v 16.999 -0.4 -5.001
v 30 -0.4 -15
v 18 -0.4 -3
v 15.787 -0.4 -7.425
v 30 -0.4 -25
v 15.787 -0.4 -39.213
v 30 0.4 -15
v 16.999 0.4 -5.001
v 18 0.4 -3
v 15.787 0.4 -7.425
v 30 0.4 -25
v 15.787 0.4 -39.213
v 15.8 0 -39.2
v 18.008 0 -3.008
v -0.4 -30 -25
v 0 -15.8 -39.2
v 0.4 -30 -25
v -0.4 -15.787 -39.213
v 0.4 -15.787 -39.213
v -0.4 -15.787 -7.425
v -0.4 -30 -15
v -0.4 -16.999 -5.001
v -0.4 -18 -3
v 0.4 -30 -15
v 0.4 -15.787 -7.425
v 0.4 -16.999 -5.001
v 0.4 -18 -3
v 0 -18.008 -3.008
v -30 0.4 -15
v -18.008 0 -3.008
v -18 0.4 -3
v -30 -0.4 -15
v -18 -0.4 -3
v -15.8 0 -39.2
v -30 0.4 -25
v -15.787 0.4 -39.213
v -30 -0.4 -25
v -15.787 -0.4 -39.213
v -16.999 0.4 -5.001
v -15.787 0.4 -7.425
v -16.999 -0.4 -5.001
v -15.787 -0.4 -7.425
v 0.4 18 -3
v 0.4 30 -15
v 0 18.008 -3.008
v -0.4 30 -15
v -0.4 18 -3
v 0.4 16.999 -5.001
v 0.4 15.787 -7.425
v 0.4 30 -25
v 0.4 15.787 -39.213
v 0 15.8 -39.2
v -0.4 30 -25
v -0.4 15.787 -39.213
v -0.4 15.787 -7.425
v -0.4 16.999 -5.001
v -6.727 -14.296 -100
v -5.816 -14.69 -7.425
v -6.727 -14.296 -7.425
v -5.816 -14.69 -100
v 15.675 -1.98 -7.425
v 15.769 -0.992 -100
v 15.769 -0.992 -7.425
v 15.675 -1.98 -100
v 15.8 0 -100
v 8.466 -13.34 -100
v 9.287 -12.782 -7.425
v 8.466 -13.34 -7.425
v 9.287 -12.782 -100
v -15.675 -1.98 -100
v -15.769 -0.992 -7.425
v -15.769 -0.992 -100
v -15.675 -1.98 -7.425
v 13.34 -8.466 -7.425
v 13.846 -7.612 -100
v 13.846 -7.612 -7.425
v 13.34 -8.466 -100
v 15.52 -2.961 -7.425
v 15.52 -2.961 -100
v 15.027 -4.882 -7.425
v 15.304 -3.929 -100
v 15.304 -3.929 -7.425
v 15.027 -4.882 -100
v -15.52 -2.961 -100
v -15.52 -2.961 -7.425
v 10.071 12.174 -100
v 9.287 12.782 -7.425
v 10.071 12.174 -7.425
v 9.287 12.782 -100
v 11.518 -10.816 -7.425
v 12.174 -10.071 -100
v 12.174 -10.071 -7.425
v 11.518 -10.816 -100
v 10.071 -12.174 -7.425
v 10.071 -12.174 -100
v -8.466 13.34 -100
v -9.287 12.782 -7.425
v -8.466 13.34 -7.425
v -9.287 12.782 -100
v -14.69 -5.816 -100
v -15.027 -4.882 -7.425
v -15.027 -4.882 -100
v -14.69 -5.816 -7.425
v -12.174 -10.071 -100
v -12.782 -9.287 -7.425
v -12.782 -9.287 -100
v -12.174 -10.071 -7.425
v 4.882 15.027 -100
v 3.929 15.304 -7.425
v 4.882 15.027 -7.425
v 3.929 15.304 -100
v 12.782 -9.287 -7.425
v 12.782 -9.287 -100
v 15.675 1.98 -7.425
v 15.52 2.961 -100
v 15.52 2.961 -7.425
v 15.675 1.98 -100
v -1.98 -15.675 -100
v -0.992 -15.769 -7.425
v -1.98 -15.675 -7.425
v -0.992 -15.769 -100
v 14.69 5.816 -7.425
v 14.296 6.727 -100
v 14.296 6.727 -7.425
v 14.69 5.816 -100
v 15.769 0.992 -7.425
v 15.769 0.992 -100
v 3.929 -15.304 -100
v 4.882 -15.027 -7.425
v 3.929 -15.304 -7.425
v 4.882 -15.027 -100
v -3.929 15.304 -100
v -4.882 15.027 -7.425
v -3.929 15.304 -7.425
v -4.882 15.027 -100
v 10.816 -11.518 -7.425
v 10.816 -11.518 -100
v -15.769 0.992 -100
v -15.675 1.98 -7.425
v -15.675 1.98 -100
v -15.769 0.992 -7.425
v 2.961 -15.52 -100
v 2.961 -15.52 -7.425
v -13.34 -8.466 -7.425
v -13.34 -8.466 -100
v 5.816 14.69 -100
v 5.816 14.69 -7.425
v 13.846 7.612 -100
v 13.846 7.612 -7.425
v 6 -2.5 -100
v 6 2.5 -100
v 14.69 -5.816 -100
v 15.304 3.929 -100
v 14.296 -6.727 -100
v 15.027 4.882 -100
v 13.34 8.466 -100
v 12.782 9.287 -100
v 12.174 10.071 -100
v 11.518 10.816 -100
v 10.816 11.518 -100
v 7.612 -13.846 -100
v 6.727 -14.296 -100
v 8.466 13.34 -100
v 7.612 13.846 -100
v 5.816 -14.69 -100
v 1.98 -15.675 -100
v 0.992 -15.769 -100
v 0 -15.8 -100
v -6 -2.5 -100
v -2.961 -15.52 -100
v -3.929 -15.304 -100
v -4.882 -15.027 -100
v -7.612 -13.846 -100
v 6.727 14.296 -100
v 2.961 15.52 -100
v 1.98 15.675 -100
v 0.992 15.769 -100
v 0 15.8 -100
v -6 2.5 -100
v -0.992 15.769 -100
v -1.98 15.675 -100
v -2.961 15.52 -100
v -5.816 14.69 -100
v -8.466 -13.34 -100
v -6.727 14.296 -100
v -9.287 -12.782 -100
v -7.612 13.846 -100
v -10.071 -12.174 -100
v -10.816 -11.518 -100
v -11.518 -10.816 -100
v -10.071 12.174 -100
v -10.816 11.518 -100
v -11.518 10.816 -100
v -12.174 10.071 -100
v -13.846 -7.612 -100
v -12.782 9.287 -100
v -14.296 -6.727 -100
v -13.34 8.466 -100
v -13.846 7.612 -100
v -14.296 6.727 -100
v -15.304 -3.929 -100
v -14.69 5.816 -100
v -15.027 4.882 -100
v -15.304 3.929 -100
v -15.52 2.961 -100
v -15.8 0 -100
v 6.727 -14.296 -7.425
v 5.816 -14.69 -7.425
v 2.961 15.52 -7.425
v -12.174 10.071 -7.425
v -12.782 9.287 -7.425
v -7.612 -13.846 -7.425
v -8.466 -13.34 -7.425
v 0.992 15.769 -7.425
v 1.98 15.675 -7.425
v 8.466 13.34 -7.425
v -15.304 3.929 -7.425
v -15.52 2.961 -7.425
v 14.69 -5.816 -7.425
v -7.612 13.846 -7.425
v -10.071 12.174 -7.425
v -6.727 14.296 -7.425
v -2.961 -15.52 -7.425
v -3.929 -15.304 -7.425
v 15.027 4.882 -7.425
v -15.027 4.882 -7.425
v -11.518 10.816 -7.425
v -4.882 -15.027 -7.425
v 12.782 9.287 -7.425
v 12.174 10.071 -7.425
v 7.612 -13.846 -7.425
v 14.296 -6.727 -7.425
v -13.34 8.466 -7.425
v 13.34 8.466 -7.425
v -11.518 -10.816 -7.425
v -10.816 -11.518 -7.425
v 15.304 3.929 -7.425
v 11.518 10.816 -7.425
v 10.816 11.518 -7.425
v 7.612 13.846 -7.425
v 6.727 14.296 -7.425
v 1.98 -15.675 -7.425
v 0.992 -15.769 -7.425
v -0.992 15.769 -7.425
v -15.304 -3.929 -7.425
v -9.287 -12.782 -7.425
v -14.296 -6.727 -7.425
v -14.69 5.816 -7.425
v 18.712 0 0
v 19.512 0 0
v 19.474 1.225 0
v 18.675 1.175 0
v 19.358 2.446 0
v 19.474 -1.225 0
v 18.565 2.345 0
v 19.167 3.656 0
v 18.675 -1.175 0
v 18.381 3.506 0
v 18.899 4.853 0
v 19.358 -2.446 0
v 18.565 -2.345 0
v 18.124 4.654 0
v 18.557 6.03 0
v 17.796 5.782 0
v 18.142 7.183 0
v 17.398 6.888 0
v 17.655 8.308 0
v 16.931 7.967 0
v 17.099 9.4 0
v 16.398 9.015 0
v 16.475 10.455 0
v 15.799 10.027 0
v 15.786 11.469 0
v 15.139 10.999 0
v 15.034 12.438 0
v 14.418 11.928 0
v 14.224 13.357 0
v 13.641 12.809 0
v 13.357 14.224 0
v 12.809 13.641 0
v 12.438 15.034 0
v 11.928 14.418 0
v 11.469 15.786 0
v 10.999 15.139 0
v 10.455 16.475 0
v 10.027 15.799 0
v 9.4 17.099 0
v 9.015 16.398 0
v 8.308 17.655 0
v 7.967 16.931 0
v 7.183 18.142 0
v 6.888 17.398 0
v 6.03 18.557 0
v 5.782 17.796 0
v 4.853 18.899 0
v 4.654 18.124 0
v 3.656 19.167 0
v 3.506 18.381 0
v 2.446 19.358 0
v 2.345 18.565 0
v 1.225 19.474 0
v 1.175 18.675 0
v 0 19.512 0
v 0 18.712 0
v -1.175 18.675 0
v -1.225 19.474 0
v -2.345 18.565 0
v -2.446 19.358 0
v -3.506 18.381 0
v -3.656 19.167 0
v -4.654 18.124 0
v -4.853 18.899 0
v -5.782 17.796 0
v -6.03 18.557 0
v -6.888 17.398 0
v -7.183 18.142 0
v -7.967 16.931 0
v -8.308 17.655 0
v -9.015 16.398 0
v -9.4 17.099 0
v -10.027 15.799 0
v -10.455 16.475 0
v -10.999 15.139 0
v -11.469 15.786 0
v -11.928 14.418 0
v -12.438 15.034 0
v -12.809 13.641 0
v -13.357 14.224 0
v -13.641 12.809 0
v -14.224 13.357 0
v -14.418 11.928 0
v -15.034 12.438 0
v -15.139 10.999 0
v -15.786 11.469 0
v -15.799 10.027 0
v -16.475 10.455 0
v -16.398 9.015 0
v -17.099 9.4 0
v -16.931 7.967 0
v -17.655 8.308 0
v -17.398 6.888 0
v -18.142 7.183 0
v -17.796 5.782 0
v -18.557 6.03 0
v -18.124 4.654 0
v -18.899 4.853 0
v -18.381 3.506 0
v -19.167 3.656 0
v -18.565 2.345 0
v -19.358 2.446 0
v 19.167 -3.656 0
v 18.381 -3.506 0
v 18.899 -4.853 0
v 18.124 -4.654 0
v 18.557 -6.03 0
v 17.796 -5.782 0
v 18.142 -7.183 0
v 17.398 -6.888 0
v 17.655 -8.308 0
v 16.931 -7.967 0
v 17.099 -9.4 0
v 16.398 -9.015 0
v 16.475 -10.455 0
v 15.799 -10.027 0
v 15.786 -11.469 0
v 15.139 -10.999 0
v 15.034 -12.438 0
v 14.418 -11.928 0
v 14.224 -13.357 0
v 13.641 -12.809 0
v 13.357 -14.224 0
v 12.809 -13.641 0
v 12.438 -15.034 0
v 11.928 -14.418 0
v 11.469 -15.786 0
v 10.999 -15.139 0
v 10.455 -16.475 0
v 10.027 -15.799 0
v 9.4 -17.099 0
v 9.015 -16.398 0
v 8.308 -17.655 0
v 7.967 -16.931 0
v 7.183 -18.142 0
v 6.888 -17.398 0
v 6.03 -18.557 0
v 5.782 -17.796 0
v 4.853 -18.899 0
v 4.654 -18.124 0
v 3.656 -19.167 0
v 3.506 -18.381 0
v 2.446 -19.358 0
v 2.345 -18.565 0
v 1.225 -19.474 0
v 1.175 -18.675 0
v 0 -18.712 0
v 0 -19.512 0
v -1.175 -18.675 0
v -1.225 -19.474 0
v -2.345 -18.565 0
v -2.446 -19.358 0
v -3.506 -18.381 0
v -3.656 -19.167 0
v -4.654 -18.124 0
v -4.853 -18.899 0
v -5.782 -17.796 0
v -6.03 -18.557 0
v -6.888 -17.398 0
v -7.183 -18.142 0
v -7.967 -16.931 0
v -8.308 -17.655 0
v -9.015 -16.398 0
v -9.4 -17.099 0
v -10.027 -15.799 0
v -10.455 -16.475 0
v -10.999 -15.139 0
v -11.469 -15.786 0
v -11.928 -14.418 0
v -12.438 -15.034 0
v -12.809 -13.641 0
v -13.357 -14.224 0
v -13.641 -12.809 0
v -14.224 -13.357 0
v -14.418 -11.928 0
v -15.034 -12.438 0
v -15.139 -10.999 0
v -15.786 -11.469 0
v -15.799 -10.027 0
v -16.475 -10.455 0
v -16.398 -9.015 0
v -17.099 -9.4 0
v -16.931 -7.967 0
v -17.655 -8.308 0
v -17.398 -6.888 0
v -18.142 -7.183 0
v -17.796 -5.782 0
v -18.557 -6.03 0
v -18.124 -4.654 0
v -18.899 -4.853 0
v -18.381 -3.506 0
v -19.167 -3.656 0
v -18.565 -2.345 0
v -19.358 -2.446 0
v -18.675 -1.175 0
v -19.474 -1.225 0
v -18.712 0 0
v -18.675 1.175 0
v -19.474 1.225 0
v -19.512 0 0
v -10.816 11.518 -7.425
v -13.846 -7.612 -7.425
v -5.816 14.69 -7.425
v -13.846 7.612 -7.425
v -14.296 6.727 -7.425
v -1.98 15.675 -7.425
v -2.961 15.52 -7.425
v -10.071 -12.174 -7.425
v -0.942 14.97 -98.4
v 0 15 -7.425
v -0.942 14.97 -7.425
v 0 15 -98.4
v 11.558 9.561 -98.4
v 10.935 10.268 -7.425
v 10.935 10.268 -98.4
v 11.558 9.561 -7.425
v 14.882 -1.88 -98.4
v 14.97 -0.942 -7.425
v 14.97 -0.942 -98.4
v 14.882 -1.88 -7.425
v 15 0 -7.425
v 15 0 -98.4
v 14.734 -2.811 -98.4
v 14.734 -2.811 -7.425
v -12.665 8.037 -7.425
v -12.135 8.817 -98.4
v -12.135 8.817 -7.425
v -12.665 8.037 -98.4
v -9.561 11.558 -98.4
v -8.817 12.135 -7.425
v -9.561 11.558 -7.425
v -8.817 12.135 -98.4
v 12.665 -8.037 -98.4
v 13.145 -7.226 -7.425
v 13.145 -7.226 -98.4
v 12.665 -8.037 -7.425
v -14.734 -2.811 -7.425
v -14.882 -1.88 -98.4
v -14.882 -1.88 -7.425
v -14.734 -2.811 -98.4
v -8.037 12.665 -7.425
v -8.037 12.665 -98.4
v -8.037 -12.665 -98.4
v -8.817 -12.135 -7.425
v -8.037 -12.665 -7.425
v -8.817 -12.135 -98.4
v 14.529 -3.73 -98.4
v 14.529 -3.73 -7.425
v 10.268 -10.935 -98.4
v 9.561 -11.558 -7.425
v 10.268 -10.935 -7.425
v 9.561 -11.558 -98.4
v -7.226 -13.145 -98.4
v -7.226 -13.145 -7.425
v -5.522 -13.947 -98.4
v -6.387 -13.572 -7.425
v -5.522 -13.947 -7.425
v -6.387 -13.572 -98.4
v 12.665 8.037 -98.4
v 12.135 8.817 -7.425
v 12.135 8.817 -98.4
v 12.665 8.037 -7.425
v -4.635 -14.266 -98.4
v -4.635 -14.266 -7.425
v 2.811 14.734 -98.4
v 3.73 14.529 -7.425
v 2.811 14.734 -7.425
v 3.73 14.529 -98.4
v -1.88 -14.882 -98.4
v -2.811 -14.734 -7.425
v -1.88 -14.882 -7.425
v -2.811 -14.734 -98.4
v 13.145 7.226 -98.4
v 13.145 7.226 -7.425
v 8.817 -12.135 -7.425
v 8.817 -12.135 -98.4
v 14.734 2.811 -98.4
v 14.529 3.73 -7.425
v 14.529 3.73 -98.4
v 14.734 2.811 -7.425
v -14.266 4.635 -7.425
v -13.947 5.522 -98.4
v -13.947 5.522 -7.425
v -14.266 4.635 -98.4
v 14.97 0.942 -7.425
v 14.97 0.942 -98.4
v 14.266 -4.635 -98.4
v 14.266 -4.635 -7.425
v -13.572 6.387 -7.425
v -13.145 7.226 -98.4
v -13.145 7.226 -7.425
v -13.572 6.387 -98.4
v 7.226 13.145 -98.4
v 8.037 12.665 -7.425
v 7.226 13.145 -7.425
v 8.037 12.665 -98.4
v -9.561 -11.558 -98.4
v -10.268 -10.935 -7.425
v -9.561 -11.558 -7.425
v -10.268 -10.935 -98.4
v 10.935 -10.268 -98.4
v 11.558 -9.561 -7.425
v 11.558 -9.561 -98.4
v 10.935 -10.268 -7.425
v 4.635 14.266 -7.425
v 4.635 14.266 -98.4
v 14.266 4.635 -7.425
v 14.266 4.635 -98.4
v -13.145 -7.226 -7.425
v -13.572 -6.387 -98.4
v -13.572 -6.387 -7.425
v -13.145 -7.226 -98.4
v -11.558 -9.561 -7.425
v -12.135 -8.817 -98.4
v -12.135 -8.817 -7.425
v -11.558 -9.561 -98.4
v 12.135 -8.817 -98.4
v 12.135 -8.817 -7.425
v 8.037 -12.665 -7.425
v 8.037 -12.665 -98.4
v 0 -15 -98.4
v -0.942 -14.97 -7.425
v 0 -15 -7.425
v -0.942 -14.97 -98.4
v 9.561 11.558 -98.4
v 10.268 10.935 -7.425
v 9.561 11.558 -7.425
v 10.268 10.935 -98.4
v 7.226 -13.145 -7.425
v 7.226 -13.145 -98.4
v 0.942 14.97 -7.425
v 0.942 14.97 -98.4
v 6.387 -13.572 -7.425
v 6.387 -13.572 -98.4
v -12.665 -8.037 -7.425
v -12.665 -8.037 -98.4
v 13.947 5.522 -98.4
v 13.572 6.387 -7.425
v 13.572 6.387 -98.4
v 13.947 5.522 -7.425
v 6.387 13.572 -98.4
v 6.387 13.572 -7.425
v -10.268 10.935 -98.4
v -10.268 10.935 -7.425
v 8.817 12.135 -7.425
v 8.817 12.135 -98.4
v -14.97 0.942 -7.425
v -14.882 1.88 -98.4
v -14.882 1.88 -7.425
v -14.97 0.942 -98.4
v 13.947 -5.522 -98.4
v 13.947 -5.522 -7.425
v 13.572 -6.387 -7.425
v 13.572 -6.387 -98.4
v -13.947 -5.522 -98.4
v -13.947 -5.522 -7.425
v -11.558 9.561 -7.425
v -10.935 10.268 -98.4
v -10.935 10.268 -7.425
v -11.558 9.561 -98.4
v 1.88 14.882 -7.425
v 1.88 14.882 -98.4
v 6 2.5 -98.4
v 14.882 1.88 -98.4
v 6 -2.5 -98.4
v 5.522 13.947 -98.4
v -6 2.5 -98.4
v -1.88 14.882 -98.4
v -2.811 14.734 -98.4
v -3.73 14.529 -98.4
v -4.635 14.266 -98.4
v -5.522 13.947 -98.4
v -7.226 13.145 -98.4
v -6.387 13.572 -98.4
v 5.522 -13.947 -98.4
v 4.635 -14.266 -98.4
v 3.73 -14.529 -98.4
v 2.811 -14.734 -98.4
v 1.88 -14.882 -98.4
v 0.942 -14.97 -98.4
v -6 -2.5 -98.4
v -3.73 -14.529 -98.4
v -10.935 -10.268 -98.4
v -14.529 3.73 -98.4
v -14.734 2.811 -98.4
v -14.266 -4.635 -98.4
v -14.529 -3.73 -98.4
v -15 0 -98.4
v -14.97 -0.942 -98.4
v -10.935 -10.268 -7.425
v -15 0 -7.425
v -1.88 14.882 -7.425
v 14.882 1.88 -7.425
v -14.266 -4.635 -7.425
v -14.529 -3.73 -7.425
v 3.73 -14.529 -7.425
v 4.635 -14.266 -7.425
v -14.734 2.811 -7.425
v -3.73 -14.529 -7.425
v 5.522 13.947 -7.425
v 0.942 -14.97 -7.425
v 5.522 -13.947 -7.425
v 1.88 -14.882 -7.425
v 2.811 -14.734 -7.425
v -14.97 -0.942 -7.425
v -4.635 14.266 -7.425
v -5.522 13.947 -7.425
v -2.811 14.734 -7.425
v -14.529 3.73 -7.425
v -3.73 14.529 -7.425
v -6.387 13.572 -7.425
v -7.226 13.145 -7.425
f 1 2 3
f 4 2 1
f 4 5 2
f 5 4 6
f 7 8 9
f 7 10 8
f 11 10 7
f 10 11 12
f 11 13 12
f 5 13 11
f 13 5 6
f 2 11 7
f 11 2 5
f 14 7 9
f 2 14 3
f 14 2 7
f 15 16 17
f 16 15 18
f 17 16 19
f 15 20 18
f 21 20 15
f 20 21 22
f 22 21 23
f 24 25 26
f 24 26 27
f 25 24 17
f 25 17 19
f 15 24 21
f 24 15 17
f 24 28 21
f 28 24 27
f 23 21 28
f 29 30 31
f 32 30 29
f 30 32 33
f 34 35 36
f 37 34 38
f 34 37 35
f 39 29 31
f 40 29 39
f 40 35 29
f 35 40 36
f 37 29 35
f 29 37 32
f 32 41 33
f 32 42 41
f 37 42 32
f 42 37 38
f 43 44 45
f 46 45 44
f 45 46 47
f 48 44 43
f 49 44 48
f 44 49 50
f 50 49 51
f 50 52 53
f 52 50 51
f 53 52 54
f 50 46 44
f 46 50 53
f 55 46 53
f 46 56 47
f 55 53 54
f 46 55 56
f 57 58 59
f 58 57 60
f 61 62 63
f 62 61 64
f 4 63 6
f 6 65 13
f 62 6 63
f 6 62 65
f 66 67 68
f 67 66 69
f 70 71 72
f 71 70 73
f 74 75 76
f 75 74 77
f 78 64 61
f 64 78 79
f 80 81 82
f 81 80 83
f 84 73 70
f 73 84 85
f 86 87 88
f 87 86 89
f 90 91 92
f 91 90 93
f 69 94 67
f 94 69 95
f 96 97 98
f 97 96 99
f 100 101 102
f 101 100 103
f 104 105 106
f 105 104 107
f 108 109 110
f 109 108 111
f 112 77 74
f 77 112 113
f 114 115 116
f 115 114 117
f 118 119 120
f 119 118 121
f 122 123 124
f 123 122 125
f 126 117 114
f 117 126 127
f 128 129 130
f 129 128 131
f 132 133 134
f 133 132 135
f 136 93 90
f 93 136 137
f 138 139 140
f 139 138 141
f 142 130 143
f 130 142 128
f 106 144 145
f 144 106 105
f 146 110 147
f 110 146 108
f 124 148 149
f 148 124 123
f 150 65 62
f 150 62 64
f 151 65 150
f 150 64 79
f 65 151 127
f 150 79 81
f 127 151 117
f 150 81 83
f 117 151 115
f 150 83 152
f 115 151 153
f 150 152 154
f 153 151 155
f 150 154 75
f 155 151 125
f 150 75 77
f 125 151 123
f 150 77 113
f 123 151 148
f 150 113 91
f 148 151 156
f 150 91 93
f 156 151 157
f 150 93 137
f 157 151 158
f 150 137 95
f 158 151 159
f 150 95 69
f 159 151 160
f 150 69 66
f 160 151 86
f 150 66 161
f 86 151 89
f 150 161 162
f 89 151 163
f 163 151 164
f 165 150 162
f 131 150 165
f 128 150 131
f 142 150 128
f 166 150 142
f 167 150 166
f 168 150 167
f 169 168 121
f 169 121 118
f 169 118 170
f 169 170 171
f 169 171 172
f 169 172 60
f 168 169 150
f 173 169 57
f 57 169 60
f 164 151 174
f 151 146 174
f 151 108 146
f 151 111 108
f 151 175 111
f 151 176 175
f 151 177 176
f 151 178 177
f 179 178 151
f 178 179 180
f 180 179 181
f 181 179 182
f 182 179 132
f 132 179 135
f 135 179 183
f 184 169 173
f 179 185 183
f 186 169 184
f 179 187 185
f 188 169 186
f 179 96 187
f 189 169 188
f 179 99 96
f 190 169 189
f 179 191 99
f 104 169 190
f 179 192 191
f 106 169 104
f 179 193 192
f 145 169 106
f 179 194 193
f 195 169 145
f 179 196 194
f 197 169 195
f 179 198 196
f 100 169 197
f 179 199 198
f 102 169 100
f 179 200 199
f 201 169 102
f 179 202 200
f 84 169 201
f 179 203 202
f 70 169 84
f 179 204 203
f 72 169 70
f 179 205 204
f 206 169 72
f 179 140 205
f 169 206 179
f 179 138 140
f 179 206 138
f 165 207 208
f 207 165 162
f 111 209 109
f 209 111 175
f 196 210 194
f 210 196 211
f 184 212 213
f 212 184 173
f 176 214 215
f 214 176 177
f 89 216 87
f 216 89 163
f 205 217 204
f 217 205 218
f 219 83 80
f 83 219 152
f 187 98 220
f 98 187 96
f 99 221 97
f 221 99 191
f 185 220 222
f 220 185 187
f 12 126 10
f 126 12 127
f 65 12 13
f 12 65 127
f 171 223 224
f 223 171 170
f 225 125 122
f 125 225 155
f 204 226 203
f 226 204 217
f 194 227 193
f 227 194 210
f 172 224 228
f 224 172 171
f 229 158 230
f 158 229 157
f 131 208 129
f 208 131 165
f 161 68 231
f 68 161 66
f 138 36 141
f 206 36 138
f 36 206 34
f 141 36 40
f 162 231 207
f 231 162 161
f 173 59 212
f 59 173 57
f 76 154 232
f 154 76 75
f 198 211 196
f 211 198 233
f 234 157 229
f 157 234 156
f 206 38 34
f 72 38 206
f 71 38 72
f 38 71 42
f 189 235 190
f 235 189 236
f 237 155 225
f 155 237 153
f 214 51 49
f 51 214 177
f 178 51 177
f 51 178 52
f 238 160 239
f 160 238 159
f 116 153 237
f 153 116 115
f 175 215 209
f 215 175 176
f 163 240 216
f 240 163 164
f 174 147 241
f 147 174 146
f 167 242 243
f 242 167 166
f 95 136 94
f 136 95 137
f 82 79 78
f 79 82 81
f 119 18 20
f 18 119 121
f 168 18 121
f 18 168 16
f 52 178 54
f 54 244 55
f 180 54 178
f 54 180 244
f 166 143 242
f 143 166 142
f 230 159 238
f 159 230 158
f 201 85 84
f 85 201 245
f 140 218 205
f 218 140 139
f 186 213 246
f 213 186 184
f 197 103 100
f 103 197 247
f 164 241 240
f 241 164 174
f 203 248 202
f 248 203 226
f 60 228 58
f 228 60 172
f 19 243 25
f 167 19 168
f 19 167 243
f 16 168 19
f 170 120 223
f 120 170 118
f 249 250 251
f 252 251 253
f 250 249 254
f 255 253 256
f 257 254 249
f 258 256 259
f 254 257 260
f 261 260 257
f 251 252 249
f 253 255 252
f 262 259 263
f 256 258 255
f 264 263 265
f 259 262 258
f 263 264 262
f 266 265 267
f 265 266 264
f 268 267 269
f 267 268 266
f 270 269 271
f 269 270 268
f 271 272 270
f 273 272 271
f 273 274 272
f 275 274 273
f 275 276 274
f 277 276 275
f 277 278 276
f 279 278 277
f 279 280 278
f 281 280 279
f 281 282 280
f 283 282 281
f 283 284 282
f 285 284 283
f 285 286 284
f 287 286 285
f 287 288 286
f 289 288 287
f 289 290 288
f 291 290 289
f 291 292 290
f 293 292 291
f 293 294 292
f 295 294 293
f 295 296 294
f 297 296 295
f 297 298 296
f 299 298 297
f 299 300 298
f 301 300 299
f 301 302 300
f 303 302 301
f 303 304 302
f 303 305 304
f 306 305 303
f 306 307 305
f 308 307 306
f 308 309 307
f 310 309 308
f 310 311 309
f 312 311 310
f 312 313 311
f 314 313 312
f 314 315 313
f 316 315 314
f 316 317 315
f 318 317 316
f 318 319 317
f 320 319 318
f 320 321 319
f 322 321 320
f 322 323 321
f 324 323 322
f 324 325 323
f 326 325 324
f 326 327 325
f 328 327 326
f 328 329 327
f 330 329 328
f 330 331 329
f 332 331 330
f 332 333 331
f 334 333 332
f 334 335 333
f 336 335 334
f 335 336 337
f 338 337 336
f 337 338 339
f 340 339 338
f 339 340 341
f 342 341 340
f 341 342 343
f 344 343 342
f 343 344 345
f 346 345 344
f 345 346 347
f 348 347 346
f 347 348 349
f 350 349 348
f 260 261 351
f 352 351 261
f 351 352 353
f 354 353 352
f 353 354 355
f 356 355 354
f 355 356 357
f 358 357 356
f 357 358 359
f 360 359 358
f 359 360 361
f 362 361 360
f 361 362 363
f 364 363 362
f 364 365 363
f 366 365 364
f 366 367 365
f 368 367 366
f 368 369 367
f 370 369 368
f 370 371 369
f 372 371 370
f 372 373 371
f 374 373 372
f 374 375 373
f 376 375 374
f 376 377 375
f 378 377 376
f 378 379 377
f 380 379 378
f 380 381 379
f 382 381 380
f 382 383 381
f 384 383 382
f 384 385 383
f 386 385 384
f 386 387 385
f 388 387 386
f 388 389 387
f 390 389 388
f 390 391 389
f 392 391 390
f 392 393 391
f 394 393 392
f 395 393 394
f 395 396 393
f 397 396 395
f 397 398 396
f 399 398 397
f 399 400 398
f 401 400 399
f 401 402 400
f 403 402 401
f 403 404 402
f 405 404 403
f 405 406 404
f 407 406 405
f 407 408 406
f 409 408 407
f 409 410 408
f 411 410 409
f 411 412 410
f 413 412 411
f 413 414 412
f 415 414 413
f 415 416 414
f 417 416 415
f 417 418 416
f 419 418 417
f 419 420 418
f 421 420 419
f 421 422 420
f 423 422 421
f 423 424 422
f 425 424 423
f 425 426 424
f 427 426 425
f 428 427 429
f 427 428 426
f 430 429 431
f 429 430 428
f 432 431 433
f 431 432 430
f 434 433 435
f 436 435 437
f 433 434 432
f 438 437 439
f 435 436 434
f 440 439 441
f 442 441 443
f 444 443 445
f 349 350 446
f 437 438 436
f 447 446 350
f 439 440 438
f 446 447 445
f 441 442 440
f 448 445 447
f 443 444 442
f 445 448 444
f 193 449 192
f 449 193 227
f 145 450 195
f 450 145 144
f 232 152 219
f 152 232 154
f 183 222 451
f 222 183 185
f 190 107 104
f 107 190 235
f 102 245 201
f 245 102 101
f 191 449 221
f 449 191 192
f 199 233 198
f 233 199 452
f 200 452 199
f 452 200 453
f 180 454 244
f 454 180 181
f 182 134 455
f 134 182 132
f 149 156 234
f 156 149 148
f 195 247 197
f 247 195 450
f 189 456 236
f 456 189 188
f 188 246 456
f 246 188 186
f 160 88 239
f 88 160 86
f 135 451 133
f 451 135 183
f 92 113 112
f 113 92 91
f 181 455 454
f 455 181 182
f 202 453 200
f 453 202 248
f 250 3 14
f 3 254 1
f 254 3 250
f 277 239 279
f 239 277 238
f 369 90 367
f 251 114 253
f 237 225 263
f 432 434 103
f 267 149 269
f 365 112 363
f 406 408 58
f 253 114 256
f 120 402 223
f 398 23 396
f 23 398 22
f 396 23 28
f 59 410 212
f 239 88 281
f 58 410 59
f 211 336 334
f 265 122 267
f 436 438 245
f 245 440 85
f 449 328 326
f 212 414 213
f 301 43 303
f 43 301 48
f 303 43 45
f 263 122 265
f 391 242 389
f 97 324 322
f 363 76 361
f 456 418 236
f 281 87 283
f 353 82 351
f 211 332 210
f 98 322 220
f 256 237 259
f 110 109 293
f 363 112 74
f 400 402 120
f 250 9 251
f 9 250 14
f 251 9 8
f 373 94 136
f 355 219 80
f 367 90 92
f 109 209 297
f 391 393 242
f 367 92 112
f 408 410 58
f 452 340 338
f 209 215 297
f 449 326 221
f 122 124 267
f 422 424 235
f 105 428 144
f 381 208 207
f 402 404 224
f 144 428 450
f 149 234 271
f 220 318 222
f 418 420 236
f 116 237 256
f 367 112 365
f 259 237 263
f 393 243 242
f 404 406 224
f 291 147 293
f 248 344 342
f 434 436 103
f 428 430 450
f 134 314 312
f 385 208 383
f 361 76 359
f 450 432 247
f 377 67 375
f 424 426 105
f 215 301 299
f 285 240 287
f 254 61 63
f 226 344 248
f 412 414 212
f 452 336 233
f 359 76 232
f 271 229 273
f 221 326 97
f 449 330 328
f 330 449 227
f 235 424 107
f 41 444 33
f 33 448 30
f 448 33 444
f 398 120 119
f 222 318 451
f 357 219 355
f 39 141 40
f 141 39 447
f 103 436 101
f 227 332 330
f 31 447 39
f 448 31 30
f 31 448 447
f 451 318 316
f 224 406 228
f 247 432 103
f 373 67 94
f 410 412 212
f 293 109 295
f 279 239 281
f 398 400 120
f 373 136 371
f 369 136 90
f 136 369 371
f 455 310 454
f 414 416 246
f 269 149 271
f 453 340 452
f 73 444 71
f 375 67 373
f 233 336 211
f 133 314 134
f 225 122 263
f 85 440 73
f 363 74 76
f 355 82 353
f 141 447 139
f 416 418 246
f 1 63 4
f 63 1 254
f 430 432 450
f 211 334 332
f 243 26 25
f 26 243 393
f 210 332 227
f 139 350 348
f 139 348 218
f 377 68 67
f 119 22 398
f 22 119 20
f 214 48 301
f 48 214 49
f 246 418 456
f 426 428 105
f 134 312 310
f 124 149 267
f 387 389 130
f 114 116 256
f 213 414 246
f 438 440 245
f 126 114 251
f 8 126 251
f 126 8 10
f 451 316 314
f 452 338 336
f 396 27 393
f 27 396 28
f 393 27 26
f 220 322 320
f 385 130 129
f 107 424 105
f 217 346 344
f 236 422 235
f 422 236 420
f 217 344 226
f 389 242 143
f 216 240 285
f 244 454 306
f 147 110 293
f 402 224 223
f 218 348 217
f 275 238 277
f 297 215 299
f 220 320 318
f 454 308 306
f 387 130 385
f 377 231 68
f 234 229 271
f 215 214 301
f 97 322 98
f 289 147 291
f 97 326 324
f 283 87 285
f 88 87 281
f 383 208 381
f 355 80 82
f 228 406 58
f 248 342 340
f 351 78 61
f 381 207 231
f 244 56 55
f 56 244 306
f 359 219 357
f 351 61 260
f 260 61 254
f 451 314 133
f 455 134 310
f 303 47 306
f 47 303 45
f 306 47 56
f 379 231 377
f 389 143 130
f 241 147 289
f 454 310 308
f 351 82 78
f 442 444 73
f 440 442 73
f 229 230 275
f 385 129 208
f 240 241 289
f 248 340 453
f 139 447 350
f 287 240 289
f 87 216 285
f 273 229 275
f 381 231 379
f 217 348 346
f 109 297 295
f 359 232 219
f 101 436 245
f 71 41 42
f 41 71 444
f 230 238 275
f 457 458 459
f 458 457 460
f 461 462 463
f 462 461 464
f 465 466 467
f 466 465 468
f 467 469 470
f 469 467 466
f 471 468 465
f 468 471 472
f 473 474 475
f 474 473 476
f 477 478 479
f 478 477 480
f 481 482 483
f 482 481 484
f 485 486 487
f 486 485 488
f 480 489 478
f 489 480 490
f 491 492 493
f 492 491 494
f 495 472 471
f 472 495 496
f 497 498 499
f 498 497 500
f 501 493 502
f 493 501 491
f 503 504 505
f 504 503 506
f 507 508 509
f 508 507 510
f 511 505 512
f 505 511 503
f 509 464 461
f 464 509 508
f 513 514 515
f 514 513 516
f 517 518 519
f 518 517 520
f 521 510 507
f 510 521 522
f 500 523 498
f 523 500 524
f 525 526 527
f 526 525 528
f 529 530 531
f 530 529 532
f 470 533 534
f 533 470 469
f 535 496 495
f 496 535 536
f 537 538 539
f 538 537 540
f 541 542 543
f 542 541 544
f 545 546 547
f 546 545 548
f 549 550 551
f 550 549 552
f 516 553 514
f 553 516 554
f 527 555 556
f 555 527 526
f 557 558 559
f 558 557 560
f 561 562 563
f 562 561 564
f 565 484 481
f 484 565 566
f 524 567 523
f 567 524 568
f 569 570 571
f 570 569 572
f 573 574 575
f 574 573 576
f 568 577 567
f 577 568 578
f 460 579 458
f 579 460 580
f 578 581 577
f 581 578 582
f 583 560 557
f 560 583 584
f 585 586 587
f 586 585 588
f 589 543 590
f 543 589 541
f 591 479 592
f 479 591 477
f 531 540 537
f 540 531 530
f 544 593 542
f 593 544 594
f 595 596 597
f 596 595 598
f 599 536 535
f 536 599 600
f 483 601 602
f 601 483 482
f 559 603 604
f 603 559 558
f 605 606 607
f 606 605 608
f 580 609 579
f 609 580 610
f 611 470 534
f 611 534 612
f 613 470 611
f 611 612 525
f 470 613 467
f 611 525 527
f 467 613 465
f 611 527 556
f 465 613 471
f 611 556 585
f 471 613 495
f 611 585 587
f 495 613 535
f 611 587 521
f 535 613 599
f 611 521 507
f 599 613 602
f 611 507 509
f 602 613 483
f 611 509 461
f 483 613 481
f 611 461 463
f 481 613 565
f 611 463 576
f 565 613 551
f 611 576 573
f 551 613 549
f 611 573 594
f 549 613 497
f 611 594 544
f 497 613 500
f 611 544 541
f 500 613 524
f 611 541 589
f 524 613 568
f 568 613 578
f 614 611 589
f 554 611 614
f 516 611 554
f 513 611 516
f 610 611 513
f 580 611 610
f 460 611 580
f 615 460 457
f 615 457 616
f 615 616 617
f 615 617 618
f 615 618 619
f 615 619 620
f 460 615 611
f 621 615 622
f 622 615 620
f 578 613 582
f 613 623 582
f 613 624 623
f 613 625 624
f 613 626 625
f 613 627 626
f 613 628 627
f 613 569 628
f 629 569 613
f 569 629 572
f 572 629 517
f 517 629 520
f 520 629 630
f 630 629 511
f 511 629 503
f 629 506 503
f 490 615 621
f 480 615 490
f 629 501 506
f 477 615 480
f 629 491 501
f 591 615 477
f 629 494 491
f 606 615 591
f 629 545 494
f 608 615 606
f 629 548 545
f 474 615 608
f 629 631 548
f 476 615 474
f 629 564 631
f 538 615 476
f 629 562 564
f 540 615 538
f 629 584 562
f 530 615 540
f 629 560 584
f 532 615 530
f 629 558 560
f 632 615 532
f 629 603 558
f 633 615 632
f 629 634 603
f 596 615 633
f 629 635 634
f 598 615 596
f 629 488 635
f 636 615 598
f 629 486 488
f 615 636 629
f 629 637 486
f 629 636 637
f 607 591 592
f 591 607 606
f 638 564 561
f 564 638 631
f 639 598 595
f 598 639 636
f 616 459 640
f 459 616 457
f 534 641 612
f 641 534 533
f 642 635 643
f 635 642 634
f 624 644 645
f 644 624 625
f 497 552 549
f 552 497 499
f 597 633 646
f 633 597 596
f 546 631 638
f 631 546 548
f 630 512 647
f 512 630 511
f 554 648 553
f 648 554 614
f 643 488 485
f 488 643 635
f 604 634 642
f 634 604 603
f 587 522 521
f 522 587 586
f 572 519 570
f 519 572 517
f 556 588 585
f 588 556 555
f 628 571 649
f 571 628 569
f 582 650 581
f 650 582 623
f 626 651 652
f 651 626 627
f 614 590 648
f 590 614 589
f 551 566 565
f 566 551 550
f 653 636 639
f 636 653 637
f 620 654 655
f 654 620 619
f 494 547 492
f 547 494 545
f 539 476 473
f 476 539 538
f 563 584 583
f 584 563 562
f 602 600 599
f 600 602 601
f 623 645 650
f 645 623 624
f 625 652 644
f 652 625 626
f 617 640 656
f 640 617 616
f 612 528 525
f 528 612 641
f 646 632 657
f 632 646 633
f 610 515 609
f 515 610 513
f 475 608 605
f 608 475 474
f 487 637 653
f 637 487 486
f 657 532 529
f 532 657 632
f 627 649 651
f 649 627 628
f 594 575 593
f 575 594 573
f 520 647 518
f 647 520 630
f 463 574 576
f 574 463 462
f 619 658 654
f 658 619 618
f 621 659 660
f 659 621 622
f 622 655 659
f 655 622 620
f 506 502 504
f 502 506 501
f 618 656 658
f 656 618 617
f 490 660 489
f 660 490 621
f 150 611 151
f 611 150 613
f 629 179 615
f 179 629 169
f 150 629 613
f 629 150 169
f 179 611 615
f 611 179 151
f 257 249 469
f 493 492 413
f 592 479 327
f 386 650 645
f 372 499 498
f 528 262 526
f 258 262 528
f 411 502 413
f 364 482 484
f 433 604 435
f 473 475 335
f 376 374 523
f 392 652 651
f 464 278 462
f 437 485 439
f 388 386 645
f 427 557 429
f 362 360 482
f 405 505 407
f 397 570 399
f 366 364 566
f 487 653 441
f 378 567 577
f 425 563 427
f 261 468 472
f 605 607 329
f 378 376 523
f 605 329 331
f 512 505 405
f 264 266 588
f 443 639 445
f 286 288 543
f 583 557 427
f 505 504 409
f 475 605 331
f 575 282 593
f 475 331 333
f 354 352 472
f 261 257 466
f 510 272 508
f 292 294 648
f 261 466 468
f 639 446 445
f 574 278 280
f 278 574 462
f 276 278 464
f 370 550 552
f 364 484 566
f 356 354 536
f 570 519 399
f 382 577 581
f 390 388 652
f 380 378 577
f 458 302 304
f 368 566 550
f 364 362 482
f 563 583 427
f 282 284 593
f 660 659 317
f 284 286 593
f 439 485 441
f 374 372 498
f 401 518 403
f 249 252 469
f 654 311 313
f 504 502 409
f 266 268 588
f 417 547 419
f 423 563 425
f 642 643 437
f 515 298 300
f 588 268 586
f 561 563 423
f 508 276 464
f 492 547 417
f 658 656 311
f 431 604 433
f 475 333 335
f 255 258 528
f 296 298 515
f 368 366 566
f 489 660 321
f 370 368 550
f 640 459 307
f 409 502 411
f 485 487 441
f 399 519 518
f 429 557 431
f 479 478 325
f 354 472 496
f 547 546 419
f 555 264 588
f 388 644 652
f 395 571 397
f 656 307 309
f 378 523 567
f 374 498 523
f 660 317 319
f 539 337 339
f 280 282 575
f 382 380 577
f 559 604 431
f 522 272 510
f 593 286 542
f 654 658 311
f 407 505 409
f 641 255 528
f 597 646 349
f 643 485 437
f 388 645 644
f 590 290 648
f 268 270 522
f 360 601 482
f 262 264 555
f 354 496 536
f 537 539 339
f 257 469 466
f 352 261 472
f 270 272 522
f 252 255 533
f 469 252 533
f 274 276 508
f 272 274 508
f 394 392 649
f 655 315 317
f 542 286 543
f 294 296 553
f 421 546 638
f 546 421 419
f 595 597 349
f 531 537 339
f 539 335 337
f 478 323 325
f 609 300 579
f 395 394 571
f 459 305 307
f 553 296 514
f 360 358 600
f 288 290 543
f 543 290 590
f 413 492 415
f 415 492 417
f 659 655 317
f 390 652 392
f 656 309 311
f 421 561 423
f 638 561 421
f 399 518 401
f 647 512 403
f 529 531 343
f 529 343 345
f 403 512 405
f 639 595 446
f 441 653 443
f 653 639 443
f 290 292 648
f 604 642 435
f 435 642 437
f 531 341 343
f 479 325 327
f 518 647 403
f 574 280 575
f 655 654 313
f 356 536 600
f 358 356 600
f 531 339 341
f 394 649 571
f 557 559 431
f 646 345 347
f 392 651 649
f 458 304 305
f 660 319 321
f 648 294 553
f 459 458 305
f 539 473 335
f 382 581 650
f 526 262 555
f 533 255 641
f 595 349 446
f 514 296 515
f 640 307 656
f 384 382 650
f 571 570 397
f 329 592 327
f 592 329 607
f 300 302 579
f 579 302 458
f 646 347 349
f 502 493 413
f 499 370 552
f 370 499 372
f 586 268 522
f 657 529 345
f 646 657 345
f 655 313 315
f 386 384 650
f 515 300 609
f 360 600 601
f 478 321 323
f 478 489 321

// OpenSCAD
wall = 2*0.4;
h = 100;
d = 30;

module fin()
{
  translate([d/2, wall/2, 0])
    rotate([90, 0, 0])
      linear_extrude(wall)
        polygon(points=[
          [15, 40-15],
          [0, 40],
          [0, 0],
          [15, 15]
        ]);
}


module fins(n)
{
  for(i=[0:n-1])
    rotate([0, 0, i*360/n])
      fin();
}


module bottom()
{
  $fn=100;
  led_w = 10+0.5;
  a = sqrt( led_w*led_w / 2 );
  difference()
  {
    union()
    {
      fins(4);
      cylinder(d=d+2*wall, h=h); // main block
      cylinder(d1=d+a+2*wall, d2=d+2*wall, h=a); // nozzle cut
    }
    cylinder(d=d, h=h-2*wall);      // main block
    #translate([0, 0, h])
      cube([12, 5, 5*wall], center=true); // LED-pass + cable hole
    cylinder(d1=d+a, d2=d, h=a);    // nozzle cut
  }
}

rotate([180, 0, 0])
  bottom();
